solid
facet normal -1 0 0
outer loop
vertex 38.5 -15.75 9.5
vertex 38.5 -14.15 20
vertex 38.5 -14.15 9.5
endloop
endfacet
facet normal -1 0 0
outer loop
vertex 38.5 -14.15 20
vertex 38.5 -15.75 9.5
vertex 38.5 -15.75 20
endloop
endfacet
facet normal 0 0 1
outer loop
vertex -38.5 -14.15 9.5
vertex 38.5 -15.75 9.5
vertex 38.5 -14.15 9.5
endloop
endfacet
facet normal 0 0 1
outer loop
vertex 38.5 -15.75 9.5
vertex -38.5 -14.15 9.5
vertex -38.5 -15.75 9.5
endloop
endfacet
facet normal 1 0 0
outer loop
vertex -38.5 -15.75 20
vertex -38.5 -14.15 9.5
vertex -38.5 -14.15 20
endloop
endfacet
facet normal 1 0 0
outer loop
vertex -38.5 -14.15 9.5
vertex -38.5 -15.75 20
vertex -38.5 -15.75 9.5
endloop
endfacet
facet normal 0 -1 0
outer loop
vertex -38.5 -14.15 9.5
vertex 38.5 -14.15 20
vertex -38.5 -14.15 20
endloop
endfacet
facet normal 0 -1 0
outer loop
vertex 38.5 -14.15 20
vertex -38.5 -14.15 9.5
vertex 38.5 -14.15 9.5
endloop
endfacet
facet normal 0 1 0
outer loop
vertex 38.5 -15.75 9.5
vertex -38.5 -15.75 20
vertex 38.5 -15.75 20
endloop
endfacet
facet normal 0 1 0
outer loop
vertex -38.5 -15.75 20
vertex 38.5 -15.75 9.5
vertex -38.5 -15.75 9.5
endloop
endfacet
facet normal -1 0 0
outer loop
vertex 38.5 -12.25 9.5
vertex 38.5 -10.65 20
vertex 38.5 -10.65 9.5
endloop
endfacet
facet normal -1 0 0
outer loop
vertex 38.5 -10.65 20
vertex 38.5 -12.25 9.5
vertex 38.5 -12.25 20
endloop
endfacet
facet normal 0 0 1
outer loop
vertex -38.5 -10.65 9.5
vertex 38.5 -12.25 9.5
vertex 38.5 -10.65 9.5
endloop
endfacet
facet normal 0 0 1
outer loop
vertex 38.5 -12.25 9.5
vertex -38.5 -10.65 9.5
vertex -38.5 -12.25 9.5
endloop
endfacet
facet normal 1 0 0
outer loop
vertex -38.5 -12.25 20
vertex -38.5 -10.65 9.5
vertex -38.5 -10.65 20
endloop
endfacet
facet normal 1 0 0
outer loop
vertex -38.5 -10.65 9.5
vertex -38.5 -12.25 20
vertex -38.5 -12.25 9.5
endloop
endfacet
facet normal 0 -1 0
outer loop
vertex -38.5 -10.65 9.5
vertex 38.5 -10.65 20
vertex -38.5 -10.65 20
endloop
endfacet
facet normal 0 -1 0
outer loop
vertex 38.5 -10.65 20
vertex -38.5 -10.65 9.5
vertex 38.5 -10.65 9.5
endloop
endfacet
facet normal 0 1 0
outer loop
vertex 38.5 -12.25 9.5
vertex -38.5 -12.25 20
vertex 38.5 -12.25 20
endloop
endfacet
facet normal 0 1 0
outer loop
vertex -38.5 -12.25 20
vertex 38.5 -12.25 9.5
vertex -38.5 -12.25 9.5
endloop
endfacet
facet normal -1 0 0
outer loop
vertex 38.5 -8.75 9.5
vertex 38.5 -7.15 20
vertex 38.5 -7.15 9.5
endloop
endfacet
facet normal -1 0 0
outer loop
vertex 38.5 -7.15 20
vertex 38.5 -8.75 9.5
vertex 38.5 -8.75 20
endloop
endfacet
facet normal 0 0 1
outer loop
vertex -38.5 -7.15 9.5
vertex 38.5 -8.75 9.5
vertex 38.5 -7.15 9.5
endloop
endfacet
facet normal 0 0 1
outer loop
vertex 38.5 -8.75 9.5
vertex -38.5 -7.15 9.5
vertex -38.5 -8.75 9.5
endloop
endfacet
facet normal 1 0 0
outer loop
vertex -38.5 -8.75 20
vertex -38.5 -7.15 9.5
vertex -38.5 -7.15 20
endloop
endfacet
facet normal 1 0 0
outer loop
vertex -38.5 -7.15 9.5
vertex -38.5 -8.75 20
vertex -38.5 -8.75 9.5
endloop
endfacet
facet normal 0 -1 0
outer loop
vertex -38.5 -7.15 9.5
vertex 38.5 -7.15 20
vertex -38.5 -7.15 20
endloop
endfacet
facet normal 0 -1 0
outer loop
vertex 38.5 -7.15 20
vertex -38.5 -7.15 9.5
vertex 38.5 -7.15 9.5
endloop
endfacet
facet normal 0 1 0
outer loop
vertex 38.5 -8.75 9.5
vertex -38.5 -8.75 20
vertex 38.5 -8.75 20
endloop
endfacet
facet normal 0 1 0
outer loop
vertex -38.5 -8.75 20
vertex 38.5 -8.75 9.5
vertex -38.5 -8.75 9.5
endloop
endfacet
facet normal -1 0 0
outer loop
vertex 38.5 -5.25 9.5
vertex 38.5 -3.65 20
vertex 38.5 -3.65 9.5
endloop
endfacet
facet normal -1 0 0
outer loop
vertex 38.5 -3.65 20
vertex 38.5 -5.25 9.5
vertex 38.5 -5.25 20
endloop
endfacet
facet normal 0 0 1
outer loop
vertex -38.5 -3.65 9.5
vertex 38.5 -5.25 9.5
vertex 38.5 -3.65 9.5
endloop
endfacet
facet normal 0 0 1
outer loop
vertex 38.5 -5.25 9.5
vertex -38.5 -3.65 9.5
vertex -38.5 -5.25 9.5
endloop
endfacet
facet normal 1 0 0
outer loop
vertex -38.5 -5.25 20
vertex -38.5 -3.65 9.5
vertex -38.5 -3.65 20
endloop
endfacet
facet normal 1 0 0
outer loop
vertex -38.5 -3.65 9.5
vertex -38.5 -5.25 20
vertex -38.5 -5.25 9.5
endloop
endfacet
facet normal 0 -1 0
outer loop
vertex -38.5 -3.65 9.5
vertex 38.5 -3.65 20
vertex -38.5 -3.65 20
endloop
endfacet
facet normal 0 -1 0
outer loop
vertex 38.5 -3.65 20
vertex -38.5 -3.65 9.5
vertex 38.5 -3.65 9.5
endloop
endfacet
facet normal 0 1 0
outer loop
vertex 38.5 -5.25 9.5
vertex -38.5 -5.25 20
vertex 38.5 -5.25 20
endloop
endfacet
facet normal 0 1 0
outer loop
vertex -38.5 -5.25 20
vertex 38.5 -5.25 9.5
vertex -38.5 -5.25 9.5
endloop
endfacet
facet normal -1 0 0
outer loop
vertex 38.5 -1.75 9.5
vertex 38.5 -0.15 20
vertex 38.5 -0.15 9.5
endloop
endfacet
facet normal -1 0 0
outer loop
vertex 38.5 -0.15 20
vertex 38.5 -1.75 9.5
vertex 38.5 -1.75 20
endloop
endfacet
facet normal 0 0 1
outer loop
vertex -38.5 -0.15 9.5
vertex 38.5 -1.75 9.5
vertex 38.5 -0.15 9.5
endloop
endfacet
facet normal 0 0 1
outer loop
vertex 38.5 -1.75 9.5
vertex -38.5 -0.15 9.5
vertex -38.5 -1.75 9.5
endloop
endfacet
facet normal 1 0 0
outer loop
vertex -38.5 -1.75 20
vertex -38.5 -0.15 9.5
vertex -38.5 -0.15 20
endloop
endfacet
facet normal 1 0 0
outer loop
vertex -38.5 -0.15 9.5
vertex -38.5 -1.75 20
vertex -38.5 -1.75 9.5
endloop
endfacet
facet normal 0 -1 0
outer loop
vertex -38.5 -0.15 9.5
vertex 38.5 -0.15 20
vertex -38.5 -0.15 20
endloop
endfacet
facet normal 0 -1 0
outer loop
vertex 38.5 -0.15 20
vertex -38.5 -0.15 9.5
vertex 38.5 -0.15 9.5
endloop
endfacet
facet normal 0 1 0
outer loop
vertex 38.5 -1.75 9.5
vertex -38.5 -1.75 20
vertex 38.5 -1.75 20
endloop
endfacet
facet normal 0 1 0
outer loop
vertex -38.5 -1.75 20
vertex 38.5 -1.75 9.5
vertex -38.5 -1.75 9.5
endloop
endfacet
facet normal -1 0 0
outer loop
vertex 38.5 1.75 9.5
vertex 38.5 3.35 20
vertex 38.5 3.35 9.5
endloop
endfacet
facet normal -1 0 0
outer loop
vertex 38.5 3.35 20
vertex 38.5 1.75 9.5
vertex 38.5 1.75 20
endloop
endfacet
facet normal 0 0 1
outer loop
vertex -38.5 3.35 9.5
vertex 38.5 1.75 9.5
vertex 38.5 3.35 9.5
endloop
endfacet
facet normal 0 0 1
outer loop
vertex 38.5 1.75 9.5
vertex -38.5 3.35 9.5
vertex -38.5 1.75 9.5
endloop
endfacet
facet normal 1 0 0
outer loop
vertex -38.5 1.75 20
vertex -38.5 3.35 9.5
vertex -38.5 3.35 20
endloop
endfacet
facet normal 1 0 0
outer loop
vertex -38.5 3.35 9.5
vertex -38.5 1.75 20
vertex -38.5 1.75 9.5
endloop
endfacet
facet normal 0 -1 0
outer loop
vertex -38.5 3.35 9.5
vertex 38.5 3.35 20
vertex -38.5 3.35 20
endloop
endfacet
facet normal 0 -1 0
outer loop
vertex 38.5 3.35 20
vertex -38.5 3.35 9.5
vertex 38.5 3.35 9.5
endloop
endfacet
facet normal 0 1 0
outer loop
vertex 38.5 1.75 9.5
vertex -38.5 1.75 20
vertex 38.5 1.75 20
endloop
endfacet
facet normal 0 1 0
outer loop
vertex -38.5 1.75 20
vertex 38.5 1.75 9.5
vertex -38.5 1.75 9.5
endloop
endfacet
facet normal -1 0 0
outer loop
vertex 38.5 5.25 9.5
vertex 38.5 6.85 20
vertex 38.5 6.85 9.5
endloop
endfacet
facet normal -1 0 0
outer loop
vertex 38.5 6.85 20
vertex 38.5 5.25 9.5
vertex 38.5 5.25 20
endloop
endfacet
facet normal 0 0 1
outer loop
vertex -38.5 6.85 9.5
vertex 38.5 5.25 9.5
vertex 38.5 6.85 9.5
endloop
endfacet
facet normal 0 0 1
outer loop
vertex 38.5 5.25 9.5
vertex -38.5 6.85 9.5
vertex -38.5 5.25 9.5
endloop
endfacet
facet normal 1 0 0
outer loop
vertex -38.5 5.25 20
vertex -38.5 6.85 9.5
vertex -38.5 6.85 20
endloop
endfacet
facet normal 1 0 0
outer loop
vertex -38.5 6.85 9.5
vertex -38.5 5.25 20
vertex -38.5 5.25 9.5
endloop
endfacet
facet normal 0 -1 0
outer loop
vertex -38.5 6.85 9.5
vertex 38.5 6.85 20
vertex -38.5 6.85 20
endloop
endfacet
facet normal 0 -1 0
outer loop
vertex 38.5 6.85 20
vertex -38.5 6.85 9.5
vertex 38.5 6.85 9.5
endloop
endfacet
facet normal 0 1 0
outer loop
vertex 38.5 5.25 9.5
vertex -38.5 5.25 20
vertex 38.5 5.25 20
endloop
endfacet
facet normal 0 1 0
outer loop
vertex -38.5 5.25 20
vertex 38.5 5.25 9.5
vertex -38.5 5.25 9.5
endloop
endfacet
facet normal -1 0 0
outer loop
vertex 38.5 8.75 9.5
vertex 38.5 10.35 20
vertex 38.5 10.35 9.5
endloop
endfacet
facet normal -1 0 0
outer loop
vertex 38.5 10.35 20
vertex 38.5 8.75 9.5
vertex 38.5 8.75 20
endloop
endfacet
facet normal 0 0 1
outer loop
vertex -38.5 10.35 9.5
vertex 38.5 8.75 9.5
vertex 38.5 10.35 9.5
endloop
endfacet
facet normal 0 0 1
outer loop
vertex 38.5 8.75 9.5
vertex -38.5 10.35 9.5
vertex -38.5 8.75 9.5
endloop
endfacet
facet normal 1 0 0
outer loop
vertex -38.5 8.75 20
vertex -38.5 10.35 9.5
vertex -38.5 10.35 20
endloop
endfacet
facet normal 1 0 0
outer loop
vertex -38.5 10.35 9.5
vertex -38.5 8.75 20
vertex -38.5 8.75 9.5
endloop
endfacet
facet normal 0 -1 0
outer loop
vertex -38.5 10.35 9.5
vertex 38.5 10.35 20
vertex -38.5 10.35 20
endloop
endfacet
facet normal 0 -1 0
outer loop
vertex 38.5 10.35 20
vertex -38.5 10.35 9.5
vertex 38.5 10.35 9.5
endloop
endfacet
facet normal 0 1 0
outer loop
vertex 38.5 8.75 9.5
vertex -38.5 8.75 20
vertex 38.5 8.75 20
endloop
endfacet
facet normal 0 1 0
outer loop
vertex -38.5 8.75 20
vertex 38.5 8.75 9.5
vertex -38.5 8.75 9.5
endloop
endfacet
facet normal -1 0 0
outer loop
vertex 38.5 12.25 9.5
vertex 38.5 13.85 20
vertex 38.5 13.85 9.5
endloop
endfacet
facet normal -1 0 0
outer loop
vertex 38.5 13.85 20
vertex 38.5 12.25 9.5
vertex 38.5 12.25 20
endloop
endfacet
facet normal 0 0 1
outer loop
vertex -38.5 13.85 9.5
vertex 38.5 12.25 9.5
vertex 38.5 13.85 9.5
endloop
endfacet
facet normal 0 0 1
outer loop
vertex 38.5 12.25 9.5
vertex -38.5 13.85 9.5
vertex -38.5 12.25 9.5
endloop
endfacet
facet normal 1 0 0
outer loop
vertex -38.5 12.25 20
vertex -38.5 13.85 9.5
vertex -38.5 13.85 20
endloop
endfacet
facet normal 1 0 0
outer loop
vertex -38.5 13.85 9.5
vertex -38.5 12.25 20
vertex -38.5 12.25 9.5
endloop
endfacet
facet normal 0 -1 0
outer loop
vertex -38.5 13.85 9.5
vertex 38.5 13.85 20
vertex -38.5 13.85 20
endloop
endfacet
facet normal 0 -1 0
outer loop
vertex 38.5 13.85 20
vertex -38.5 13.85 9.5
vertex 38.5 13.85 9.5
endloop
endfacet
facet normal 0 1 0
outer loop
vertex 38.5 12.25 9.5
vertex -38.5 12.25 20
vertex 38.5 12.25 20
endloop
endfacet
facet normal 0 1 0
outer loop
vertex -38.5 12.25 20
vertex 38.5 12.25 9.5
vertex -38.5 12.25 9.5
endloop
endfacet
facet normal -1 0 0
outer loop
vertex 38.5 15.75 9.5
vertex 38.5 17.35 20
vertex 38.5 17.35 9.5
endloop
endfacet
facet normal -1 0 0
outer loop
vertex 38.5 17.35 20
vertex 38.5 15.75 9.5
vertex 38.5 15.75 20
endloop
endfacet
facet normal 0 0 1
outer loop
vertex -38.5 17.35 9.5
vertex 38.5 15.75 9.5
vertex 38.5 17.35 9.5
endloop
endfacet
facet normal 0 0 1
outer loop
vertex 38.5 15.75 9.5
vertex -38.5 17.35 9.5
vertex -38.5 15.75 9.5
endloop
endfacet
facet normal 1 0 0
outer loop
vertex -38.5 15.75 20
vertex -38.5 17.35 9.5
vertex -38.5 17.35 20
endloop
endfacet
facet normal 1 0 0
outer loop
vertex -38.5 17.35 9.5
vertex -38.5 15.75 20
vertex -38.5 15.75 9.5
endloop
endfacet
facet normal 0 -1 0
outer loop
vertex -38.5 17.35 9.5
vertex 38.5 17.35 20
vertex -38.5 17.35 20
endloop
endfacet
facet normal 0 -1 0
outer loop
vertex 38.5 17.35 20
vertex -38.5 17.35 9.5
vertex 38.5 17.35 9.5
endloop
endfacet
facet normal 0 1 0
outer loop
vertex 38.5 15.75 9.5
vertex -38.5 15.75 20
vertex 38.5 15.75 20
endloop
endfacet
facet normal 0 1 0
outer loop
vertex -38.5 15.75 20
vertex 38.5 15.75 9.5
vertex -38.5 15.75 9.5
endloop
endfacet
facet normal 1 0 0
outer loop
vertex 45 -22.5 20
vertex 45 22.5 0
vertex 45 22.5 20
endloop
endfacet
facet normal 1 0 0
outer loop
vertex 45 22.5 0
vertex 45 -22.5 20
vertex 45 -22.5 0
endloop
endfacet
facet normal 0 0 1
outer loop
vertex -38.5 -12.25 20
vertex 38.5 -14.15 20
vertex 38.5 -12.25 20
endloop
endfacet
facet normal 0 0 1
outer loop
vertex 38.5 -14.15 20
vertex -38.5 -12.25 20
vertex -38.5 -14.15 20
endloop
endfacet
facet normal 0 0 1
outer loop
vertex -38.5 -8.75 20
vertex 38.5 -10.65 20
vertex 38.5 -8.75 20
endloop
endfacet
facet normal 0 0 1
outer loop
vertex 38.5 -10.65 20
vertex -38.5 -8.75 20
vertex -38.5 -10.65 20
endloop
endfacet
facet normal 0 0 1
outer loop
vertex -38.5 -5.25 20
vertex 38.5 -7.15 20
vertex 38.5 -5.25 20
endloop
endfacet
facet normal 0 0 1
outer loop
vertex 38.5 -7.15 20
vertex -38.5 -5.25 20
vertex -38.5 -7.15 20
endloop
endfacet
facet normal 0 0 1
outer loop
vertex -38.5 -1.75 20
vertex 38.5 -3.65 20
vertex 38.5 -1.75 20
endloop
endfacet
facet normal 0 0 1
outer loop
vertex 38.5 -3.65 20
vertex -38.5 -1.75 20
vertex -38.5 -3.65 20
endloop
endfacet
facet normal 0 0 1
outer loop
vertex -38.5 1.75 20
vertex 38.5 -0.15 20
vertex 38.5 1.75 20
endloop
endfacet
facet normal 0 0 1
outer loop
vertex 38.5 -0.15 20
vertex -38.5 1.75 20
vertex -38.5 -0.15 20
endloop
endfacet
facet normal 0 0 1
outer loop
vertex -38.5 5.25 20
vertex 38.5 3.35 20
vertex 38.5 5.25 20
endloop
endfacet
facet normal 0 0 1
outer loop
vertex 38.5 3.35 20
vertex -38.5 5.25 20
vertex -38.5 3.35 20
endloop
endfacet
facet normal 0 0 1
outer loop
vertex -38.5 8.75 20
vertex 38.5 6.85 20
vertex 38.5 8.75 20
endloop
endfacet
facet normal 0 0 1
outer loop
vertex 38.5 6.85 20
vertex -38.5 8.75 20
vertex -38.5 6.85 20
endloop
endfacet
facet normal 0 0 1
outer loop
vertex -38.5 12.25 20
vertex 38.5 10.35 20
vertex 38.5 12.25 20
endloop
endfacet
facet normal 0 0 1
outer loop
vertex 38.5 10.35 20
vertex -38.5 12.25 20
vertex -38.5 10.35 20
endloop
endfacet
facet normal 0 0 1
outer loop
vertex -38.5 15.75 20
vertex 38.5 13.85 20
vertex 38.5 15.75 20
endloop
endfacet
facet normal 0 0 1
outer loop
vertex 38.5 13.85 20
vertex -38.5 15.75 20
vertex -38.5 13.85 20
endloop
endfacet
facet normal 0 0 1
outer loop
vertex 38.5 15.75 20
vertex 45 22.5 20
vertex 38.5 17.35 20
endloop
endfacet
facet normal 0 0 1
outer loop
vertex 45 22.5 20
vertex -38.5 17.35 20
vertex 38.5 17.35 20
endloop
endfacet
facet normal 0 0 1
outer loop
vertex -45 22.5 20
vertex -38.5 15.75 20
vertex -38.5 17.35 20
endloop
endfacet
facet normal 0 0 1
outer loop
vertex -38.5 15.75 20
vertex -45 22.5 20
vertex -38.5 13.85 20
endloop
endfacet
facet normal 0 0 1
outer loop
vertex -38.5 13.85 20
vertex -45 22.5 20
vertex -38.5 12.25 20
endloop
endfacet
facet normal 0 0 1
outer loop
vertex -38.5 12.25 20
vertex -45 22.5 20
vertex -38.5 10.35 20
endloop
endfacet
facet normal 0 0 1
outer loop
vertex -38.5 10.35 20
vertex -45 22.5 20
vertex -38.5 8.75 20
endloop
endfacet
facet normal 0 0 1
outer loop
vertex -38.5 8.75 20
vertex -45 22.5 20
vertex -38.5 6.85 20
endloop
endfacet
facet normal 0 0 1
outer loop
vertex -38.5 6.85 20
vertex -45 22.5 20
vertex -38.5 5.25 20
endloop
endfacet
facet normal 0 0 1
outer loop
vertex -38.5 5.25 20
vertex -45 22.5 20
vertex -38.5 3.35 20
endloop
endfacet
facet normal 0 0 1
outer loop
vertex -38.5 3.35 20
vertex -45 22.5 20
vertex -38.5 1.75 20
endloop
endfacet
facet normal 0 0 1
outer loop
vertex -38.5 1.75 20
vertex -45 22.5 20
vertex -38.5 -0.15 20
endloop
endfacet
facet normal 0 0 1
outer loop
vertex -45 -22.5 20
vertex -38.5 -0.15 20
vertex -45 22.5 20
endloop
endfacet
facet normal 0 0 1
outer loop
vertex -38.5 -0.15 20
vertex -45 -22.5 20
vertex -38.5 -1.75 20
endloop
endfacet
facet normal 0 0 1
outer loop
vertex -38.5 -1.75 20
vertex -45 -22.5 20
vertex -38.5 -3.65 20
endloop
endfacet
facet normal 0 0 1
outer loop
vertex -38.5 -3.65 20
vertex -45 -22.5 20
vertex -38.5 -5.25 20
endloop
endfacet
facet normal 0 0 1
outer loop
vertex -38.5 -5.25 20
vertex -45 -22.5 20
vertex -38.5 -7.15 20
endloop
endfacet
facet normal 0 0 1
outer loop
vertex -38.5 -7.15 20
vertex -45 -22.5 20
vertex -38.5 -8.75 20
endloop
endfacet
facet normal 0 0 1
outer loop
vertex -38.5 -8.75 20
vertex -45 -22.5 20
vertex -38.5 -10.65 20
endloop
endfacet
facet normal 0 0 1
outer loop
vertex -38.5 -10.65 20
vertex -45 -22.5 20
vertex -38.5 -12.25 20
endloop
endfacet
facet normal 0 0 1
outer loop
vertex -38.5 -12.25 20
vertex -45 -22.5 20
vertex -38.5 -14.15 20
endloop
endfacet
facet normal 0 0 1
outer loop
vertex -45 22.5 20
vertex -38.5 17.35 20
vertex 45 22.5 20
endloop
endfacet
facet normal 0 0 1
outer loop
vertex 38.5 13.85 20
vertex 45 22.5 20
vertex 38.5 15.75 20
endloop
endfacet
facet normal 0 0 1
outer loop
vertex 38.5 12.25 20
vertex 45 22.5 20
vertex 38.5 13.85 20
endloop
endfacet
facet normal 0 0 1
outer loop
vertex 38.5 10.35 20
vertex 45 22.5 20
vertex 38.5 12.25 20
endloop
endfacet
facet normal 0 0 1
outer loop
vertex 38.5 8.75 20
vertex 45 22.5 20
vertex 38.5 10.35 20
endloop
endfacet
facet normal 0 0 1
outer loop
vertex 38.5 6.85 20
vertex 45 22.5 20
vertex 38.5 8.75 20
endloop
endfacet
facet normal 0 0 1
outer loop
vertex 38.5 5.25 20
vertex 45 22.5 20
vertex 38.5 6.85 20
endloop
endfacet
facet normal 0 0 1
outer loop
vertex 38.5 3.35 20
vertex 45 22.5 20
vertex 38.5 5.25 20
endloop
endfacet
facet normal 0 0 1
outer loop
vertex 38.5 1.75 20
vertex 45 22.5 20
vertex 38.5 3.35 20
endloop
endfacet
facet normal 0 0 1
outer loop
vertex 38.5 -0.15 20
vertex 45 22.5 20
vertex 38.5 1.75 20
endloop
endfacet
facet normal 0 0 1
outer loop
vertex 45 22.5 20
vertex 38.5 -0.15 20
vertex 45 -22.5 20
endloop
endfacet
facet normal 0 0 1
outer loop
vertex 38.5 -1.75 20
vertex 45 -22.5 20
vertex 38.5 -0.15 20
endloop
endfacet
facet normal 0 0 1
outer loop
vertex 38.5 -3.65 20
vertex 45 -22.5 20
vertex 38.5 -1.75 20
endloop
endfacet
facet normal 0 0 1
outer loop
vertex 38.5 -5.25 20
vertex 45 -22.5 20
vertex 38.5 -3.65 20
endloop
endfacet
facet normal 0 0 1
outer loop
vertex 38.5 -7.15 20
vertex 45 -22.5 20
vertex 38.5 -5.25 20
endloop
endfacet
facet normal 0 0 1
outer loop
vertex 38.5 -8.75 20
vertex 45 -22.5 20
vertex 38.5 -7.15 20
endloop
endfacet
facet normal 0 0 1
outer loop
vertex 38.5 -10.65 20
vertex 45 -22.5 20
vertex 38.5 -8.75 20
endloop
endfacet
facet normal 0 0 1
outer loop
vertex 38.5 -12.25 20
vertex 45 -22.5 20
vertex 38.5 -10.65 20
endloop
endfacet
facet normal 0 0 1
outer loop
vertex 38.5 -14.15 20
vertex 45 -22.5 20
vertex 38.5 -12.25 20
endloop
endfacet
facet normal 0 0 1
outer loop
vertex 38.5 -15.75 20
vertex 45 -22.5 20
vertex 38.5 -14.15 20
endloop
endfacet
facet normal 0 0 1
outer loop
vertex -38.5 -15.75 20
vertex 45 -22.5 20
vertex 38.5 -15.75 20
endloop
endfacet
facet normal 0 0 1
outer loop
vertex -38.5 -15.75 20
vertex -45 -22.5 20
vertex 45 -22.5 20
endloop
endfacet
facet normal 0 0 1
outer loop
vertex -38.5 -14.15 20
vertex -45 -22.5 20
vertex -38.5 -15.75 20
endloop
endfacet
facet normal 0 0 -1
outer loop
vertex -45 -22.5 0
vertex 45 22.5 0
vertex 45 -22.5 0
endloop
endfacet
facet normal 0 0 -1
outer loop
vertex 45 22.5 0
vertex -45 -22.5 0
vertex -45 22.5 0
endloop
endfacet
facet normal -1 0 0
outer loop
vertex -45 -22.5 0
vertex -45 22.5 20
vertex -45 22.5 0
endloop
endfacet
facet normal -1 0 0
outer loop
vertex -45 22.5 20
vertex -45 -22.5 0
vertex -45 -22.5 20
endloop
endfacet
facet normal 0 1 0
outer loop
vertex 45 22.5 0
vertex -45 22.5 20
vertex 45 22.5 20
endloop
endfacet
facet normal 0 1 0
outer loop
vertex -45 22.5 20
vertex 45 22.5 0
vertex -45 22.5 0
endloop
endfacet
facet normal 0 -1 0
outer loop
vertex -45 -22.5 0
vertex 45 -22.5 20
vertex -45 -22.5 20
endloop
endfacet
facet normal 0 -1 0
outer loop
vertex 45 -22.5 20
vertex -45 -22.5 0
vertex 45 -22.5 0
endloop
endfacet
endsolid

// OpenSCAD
// Microscope slide drying rack
// Print orientation: base block on XY plane, slots open upward (+Z)

// ---------- Parameters ----------
block_len      = 90;    // block length along X (mm)
block_wid      = 45;    // block width along Y (mm)
block_h        = 20;    // block height along Z (mm)

slot_count     = 10;    // number of slide slots
slot_len       = 77;    // slot length along X (mm)
slot_w         = 1.6;   // slot width along Y (mm)
slot_depth     = 10;    // slot depth from top face (mm)
slot_pitch     = 3.5;   // centre-to-centre slot spacing in Y (mm)

eps            = 0.5;   // overcut past faces to avoid coplanar surfaces (mm)

$fn = 64;

// ---------- Derived ----------
slot_x0 = -(slot_len / 2);   // first slot start in X
// Slot group centred on block: first slot at y = -(n-1)*pitch/2

// ---------- Model ----------
difference() {
    // Solid base block
    translate([-block_len / 2, -block_wid / 2, 0])
        cube([block_len, block_wid, block_h]);

    // Parallel slots open at the top
    for (i = [0 : slot_count - 1]) {
        translate([slot_x0, -(slot_count - 1) * slot_pitch / 2 + i * slot_pitch,
                   block_h - slot_depth])
            translate([0, 0, -eps])
                cube([slot_len, slot_w, slot_depth + 2 * eps]);
    }
}
